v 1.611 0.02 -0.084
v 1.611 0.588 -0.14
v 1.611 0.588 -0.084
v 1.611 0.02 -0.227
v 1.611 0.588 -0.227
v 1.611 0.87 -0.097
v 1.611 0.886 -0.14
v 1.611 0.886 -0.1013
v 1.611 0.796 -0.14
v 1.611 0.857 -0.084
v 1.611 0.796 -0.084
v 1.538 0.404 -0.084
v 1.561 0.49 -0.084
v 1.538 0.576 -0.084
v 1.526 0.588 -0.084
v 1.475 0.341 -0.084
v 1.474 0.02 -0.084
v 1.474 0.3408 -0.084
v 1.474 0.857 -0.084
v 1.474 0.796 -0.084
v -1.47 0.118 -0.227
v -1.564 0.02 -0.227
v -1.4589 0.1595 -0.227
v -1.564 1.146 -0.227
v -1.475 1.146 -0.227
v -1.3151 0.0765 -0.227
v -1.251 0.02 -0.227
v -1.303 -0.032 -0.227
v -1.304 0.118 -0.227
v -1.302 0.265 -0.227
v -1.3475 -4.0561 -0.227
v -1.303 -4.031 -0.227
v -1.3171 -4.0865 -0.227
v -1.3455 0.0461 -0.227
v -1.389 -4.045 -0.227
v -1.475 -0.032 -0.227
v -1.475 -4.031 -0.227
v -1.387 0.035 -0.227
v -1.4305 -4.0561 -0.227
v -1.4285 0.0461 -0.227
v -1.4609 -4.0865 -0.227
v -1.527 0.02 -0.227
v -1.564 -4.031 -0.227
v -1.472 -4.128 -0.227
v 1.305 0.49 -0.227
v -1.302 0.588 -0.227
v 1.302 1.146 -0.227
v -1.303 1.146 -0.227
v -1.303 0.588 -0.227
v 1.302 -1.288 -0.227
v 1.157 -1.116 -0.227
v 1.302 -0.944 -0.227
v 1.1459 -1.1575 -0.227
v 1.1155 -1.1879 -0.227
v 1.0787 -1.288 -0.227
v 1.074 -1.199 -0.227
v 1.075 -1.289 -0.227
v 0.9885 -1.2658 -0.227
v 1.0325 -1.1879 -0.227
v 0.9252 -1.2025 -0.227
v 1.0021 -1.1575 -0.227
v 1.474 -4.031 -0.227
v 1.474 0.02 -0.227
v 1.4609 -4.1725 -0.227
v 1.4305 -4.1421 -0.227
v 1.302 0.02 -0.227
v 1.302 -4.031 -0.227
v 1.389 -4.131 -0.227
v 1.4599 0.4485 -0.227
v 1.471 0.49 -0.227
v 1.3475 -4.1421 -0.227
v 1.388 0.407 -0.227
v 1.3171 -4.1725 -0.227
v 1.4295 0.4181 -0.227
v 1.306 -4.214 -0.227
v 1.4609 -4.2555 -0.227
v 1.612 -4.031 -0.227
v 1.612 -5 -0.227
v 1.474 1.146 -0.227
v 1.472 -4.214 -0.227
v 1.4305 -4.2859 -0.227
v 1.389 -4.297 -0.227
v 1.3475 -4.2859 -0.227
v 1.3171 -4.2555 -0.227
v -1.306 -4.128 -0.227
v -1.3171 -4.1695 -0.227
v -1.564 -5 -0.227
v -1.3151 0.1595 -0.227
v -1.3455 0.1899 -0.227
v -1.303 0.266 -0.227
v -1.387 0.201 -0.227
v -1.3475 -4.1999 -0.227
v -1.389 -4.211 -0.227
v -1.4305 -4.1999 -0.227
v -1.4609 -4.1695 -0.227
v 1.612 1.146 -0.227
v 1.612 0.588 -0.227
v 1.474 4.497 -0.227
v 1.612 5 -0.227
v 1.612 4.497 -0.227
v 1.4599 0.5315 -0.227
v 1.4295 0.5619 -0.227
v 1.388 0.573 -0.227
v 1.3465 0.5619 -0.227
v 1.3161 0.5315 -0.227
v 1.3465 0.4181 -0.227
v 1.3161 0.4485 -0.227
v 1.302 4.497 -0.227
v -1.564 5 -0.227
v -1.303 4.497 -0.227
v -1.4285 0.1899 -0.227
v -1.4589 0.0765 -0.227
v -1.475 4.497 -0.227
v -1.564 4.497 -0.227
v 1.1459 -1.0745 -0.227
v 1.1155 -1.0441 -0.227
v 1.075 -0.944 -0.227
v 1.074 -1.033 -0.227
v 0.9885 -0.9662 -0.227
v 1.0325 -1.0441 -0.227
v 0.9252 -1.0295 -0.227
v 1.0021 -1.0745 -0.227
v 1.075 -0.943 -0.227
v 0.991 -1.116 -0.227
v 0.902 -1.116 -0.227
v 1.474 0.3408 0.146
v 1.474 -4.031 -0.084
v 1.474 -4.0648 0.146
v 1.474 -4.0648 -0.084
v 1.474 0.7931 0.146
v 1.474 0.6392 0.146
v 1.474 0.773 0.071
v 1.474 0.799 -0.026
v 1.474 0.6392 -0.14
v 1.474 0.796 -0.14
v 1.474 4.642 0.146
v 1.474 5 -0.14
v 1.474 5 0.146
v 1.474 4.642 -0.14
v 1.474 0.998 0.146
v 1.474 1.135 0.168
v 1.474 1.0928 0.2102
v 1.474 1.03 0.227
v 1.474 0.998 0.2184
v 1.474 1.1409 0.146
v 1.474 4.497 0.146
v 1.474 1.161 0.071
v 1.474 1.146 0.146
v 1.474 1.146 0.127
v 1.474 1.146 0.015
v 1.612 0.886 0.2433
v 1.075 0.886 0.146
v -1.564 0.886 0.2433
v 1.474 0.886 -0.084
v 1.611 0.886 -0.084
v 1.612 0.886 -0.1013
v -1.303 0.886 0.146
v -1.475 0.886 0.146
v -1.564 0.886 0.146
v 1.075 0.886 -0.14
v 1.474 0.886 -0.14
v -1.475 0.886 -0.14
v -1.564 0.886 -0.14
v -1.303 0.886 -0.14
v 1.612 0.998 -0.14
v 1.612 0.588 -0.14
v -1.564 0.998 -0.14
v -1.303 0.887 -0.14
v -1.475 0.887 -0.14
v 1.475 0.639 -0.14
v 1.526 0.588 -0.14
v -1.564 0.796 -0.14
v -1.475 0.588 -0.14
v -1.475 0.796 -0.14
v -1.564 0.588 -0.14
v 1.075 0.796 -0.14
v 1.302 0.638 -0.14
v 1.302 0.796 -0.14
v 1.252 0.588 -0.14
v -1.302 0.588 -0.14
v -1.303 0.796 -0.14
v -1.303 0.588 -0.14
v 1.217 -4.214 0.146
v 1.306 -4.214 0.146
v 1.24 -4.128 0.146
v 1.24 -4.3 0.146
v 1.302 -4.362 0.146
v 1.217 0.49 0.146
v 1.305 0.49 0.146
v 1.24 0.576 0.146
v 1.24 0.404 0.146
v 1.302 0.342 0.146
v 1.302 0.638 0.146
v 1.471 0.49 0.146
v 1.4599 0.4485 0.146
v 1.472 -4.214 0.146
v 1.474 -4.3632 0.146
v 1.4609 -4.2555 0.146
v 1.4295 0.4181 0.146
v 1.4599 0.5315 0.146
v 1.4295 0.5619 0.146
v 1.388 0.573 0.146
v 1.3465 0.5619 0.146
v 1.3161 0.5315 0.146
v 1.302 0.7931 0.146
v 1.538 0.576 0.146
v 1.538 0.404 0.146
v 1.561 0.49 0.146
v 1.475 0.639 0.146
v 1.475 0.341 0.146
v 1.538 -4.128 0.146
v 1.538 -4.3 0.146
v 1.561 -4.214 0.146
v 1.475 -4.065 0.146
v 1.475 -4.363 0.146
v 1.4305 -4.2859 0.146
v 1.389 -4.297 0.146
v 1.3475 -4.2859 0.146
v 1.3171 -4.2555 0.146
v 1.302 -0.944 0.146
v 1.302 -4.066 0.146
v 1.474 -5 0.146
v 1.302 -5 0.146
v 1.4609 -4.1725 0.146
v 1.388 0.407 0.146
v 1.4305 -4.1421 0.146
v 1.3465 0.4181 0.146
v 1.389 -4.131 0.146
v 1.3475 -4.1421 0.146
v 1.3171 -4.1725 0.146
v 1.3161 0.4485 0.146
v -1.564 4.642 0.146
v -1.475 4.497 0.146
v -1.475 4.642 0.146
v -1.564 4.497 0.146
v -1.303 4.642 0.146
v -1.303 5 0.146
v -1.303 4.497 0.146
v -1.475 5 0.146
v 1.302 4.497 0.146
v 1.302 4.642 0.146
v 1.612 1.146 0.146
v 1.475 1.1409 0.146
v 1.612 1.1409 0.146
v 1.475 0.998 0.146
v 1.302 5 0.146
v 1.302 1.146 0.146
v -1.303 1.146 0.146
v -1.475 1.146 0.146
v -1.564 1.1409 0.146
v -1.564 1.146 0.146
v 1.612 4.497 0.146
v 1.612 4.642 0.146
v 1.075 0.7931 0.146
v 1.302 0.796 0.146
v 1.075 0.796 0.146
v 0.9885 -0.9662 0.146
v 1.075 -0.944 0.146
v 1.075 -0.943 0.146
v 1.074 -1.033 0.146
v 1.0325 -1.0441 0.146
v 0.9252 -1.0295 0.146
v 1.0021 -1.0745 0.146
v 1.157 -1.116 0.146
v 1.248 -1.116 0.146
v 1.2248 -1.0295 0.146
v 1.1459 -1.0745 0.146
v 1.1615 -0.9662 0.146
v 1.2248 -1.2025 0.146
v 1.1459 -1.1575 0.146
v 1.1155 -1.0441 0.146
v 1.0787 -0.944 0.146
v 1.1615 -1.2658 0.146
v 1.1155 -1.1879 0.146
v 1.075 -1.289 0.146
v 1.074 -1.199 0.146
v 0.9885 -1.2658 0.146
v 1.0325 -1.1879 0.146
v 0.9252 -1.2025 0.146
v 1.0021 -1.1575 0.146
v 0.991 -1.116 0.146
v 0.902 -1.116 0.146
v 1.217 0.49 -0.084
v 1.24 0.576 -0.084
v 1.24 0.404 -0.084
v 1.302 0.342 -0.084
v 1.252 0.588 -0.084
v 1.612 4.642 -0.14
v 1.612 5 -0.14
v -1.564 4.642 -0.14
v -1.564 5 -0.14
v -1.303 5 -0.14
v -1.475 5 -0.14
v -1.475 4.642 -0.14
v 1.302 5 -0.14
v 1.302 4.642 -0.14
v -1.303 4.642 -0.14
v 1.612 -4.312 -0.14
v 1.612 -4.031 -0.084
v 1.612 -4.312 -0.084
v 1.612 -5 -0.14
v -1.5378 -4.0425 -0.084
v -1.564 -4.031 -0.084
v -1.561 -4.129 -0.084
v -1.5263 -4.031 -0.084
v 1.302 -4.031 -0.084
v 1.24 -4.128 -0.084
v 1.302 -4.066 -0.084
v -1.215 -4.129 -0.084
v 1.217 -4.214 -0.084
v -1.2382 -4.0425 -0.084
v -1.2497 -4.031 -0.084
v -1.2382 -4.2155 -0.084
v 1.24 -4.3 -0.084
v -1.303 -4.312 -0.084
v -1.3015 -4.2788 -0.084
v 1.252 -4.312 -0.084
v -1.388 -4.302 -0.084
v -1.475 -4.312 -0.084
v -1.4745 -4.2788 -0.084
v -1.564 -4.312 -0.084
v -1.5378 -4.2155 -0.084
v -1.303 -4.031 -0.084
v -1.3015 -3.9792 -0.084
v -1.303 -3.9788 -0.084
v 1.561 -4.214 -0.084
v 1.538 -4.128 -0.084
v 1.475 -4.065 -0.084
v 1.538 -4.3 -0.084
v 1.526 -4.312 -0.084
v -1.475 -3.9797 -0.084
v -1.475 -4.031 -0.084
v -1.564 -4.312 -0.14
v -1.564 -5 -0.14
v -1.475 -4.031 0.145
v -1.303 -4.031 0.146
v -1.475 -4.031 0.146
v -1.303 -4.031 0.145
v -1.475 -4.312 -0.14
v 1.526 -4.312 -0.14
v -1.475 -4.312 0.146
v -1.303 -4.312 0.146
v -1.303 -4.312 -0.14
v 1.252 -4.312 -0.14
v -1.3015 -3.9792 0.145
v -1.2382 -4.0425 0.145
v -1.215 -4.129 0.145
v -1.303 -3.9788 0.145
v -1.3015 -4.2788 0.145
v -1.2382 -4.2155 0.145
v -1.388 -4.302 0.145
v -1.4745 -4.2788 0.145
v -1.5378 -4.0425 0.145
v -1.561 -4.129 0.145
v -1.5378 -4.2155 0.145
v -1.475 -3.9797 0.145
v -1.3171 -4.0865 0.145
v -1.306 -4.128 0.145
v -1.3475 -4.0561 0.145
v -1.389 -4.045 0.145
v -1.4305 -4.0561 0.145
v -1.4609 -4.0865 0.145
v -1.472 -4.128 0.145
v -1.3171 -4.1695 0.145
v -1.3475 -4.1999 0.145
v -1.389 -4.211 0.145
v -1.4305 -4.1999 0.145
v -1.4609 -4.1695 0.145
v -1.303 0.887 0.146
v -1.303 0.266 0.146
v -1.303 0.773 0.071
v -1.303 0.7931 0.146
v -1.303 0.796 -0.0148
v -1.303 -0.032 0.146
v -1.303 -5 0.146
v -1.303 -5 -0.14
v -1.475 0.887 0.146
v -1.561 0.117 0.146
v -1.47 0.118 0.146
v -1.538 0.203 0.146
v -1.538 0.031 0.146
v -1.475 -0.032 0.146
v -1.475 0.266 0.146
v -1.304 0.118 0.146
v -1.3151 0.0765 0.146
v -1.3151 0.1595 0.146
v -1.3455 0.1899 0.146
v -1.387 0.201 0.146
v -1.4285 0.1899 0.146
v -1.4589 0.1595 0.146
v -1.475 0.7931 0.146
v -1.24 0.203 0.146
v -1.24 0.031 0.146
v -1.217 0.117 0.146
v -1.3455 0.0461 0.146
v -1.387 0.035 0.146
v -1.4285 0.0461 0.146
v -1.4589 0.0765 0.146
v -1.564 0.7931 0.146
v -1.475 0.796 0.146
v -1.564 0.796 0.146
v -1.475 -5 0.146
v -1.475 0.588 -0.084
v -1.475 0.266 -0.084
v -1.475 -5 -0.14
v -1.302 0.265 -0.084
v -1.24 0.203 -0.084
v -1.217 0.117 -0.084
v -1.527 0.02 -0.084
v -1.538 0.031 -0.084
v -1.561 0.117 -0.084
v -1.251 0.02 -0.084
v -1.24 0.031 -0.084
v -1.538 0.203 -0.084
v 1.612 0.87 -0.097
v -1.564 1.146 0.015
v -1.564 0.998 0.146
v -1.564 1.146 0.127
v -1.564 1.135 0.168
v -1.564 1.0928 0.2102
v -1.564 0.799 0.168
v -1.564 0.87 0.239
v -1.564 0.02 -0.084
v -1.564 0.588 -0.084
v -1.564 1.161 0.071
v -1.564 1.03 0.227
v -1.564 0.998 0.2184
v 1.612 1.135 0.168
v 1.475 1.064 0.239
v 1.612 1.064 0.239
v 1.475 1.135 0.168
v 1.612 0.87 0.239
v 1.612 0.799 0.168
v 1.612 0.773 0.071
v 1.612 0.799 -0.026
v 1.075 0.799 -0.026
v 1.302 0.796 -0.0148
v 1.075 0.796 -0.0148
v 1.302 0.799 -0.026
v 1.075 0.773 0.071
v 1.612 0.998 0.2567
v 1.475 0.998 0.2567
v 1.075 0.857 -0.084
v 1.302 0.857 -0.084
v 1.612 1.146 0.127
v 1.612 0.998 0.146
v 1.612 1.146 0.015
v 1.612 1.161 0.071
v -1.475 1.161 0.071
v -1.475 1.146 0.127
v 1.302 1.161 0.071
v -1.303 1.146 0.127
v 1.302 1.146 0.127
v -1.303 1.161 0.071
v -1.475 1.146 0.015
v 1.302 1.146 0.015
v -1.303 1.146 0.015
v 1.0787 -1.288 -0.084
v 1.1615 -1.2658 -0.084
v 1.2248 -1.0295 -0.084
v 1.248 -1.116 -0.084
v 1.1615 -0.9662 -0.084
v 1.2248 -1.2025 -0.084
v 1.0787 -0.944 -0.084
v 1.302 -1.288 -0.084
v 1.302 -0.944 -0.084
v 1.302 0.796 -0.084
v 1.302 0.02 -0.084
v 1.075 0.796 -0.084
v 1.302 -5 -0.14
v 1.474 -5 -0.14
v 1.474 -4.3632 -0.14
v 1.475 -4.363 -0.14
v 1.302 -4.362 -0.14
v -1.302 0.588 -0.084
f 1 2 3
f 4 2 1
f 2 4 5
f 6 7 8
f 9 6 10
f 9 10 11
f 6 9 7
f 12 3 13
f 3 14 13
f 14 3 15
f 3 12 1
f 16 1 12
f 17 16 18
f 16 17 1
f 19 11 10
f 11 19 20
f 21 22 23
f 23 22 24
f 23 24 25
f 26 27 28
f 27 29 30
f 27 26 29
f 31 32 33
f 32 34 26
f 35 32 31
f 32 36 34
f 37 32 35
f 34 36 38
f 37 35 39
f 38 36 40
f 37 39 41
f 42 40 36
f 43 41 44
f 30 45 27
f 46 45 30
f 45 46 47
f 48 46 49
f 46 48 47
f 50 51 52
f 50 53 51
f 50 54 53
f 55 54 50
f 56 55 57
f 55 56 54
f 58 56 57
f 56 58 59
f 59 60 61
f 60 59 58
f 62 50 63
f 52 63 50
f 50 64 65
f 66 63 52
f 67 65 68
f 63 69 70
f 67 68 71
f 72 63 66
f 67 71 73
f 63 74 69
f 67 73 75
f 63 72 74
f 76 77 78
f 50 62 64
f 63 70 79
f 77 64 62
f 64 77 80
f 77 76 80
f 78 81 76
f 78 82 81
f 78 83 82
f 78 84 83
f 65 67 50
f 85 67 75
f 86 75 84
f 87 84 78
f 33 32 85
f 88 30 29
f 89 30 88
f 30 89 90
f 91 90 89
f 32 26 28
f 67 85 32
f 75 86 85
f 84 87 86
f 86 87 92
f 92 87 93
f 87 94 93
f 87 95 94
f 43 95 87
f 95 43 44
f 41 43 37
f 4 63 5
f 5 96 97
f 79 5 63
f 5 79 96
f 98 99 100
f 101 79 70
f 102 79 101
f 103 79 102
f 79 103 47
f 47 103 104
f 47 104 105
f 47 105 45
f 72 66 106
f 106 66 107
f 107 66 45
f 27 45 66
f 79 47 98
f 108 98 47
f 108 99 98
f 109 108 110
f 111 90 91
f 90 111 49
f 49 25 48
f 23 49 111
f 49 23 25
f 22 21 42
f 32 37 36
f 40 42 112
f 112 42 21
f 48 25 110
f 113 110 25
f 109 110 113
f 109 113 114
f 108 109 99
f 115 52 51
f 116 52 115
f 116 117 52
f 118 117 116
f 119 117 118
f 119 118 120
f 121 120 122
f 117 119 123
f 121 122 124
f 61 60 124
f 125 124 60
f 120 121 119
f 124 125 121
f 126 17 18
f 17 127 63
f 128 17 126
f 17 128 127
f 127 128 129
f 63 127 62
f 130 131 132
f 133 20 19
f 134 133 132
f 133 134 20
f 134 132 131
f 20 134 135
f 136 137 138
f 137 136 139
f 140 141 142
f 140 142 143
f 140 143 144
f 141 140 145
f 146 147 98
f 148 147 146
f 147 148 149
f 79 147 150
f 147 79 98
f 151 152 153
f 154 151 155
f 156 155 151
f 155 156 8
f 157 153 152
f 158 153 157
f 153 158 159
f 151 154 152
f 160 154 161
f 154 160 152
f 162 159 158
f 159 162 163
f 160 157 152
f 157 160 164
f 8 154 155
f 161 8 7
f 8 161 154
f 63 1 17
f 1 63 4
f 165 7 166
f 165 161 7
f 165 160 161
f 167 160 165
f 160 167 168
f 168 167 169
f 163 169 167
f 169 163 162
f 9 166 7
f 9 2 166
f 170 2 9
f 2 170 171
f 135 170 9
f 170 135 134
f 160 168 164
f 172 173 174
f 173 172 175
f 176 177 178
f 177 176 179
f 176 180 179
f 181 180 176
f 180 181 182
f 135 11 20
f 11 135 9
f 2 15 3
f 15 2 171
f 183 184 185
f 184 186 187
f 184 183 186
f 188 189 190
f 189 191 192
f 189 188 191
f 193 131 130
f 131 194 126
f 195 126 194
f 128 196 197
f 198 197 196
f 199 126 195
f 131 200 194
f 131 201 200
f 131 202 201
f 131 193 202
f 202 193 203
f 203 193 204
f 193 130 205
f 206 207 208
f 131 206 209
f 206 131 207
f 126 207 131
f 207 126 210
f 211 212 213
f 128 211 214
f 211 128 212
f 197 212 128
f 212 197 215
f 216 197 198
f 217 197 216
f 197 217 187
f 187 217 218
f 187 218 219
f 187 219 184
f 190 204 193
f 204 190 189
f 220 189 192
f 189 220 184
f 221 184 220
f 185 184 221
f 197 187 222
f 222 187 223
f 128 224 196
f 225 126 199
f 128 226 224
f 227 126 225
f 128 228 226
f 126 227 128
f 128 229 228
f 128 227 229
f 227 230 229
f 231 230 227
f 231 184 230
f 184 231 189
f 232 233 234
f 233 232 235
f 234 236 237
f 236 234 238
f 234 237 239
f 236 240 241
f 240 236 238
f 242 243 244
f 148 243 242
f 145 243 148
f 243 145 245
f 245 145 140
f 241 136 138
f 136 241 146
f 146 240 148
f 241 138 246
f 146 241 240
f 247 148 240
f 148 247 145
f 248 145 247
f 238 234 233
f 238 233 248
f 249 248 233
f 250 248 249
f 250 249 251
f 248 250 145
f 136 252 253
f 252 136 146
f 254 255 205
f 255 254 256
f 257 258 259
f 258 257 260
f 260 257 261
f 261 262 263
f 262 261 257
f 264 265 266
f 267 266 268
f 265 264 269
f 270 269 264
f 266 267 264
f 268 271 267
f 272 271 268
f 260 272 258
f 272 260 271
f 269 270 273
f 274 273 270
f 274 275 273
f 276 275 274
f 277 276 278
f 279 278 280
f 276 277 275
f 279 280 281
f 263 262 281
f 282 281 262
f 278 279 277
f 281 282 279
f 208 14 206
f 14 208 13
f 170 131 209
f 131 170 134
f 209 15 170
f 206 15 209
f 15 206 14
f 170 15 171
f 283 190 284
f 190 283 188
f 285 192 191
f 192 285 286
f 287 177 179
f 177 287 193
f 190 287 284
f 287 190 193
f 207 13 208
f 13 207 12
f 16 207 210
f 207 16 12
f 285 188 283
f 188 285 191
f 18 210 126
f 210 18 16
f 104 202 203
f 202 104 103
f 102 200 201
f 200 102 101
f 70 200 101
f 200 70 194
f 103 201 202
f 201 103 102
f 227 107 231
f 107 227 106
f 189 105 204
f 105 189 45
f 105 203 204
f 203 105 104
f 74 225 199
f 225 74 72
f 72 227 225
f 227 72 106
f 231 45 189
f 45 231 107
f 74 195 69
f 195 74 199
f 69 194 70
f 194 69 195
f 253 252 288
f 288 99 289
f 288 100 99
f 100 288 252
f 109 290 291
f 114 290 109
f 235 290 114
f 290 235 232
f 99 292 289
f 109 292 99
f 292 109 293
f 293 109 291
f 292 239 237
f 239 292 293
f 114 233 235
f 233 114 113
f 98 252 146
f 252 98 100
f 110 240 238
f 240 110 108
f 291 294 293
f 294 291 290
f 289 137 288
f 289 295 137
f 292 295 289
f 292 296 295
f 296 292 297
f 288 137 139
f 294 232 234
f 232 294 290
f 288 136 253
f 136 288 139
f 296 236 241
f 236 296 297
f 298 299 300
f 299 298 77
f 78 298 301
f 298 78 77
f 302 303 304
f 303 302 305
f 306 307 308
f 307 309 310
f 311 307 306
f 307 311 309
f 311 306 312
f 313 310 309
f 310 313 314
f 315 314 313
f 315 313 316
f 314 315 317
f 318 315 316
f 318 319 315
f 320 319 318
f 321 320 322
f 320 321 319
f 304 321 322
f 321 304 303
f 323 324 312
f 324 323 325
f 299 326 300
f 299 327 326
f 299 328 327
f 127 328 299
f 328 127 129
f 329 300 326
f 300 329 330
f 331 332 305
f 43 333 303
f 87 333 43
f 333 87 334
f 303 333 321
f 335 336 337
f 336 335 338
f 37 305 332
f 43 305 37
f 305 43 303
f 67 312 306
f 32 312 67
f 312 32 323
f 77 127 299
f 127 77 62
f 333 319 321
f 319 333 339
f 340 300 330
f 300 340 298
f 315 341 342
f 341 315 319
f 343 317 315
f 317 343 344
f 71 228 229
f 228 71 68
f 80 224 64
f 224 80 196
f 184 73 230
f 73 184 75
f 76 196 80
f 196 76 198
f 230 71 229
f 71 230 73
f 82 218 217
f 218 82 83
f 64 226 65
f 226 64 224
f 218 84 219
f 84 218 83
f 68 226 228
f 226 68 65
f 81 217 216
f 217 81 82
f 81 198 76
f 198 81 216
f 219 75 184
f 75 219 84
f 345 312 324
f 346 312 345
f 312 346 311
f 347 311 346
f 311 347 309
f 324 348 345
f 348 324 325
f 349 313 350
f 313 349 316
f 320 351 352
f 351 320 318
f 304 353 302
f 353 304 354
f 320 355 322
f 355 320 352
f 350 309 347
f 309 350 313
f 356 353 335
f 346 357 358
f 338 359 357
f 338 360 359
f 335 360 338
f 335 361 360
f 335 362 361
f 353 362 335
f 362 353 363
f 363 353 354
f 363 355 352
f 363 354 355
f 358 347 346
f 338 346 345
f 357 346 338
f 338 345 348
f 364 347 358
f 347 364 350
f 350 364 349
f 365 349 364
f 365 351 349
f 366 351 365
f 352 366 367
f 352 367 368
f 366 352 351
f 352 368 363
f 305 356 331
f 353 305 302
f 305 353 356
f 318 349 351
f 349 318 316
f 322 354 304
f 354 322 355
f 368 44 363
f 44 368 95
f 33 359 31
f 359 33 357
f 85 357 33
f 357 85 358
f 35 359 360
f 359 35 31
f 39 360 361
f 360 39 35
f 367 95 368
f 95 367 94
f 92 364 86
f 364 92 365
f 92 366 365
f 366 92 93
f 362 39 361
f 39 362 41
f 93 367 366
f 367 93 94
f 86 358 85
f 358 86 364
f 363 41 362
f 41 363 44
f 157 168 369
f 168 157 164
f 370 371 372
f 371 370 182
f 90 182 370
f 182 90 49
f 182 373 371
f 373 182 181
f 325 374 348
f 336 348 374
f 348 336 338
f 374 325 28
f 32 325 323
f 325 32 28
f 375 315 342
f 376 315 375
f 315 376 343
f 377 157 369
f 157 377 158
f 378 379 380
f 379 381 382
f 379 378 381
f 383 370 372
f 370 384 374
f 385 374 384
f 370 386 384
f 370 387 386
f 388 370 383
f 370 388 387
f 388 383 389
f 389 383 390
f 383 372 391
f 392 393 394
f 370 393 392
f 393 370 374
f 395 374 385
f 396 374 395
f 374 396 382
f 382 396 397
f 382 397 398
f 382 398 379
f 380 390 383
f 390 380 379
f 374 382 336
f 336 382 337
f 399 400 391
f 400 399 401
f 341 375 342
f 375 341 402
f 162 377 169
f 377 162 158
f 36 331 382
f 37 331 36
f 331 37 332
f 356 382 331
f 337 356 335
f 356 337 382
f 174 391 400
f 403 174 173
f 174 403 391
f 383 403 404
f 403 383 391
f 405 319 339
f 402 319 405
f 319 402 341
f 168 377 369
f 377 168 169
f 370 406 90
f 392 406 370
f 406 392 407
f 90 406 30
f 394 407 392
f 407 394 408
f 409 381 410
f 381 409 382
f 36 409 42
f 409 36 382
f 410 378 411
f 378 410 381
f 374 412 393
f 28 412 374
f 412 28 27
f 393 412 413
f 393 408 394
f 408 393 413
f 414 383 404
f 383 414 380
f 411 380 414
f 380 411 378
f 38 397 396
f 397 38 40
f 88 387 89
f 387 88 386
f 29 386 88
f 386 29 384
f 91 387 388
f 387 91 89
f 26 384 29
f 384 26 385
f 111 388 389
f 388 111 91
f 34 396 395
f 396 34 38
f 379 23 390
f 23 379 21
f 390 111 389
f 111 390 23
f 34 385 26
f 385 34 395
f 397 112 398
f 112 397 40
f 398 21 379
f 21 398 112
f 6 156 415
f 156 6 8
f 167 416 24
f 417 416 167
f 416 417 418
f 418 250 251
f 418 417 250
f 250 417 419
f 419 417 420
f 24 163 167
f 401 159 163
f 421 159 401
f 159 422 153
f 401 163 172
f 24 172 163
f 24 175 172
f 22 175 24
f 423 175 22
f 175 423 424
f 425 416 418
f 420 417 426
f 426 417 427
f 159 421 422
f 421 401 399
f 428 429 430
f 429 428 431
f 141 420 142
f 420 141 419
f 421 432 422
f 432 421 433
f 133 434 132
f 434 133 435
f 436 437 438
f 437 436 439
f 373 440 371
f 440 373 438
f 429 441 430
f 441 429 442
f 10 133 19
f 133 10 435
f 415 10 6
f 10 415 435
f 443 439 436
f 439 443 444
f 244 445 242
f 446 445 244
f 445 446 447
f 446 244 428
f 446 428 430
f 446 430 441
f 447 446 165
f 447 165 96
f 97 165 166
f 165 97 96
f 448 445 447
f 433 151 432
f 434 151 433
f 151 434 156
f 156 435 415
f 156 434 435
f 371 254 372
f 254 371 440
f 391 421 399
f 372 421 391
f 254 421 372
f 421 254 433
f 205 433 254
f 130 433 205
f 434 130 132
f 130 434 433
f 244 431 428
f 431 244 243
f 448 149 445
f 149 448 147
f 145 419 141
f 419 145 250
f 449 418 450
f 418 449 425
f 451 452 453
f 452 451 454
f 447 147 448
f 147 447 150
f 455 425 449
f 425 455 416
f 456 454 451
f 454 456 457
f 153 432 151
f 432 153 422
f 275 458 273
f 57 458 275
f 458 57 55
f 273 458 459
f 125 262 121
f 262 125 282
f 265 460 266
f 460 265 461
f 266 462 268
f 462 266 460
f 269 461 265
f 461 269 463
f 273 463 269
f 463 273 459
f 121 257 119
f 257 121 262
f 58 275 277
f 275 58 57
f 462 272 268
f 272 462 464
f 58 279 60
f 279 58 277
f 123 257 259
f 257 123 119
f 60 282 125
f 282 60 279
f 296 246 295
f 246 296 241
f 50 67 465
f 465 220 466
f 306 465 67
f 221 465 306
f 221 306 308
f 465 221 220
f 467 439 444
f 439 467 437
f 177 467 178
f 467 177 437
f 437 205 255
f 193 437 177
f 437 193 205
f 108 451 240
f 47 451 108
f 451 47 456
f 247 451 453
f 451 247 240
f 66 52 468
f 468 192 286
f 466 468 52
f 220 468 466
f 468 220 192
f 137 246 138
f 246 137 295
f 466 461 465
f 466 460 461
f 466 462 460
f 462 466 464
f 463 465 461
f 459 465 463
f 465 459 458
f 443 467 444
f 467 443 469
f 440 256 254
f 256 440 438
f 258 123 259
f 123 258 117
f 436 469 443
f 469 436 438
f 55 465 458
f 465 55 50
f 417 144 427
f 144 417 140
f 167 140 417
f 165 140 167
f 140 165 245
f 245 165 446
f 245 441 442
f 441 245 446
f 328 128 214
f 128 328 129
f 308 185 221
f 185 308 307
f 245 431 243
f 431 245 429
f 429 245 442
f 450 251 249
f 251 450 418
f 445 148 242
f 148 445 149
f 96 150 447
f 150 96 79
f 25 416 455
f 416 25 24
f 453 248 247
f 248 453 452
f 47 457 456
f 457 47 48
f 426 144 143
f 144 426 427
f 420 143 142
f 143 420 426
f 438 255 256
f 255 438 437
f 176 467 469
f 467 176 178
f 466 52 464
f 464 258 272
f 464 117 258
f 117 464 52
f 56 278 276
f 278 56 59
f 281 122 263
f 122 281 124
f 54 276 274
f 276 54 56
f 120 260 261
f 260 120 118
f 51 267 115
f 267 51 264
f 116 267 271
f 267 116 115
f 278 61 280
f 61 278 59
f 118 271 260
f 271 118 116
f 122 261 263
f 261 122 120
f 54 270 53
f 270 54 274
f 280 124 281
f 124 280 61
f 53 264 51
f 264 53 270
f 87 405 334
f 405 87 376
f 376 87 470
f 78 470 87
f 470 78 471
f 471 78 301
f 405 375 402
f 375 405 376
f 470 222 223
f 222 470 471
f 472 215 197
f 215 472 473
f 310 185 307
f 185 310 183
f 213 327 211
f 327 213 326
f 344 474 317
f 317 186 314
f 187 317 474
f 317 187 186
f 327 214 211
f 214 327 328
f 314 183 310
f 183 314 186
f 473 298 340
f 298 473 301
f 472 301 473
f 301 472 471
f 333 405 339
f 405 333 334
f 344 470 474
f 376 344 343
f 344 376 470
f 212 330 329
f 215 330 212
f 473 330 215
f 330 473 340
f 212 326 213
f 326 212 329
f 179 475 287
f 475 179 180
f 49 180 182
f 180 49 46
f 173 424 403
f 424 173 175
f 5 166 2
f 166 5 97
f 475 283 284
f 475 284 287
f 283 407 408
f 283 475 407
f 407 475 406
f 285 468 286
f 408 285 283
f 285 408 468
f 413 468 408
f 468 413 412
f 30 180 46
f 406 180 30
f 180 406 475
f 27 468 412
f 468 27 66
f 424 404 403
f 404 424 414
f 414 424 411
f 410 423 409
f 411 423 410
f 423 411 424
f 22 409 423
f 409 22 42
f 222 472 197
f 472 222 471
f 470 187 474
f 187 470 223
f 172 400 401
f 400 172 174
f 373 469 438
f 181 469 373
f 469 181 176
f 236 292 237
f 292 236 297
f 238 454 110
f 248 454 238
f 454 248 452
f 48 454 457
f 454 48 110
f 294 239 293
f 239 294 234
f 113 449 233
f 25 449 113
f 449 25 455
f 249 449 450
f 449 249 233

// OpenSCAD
intersection() {
union() {
difference() {
translate([1.474, 0.02, -0.227]) cube(size = [0.137, 0.866, 0.143], center = false);
translate([1.302, 0.588, -0.14]) cube(size = [16.798, 0.208, 0.286], center = false);
}
translate([-1.564, 0.998, -0.227]) cube(size = [3.176, 0.148, 0.373], center = false);
translate([-1.564, 0.588, -0.227]) cube(size = [3.176, 0.41, 0.087], center = false);
translate([-1.302, 0.02, -0.227]) cube(size = [2.605, 0.568, 0.143], center = false);
translate([-1.564, 0.02, -0.227]) cube(size = [0.09, 0.568, 0.143], center = false);
difference() {
rotate([180, 0, 180])
translate([-1.389, 0.49, -0.146])
cylinder(h = 0.373, r1 = 0.172, r2 = 0.172, center = false, $fn = 12);
rotate([180, 0, 180])
translate([-1.388, 0.49, -0.146])
cylinder(h = 0.373, r1 = 0.083, r2 = 0.083, center = false, $fn = 12);
}
translate([1.302, -5, -0.227]) cube(size = [0.172, 0.688, 0.373], center = false);
difference() {
translate([-1.564, 4.497, -0.227]) cube(size = [3.176, 0.503, 0.373], center = false);
translate([-18.1, 4.642, -0.14]) cube(size = [36.2, 0.358, 18.24], center = false);
}
difference() {
union() {
rotate([0, 0, 0])
translate([-1.388, -4.129, -0.084])
cylinder(h = 0.229, r1 = 0.173, r2 = 0.173, center = false, $fn = 12);
difference() {
translate([-1.564, -4.312, -0.227]) cube(size = [3.176, 0.281, 0.143], center = false);
rotate([180, 0, 180])
translate([-1.389, -4.214, -18.1])
cylinder(h = 18.327, r1 = 0.083, r2 = 0.083, center = false, $fn = 12);
}
}
rotate([0, 0, 0])
translate([-1.389, -4.128, -18.1])
cylinder(h = 36.2, r1 = 0.083, r2 = 0.083, center = false, $fn = 12);
}
translate([-1.564, 0.796, -0.227]) cube(size = [2.639, 0.09, 0.373], center = false);
difference() {
union() {
translate([-1.475, -1.288, -0.227]) cube(size = [0.172, 2.175, 0.373], center = false);
rotate([0, 0, 0])
translate([-1.389, 0.117, -0.227])
cylinder(h = 0.373, r1 = 0.172, r2 = 0.172, center = false, $fn = 12);
}
rotate([0, 0, 0])
translate([-1.387, 0.118, -0.227])
cylinder(h = 0.373, r1 = 0.083, r2 = 0.083, center = false, $fn = 12);
}
difference() {
difference() {
union() {
rotate([180, 90, 180])
translate([-0.071, 0.967, -1.564])
cylinder(h = 3.176, r1 = 0.194, r2 = 0.194, center = false, $fn = 12);
rotate([180, 0, 180])
translate([-1.075, -1.116, -0.146])
cylinder(h = 0.373, r1 = 0.173, r2 = 0.173, center = false, $fn = 12);
translate([1.302, -4.312, -0.227]) cube(size = [0.172, 9.312, 0.373], center = false);
translate([1.075, -1.288, -0.227]) cube(size = [0.399, 2.175, 0.143], center = false);
}
intersection() {
translate([-1.564, -18.1, -0.227]) cube(size = [19.664, 19.098, 18.327], center = false);
union() {
translate([-1.564, -0.944, -18.1]) cube(size = [0.09, 1.942, 18.246], center = false);
rotate([180, 0, 180])
translate([-1.389, -4.214, -0.146])
cylinder(h = 0.373, r1 = 0.172, r2 = 0.172, center = false, $fn = 12);
}
}
}
union() {
difference() {
translate([-1.564, 0.886, -0.227]) cube(size = [3.039, 0.26, 18.327], center = false);
rotate([180, 90, 180])
translate([-0.08, 1.03, -18.1])
cylinder(h = 19.574, r1 = 0.147, r2 = 0.147, center = false, $fn = 12);
}
intersection() {
union() {
translate([-1.564, 0.886, -0.227]) cube(size = [3.176, 0.112, 18.327], center = false);
translate([1.075, -18.1, -0.227]) cube(size = [0.227, 18.896, 0.373], center = false);
}
translate([-1.564, -0.944, -0.227]) cube(size = [3.176, 2.09, 18.327], center = false);
}
rotate([180, 0, 180])
translate([-1.074, -1.116, -18.1])
cylinder(h = 18.327, r1 = 0.083, r2 = 0.083, center = false, $fn = 12);
rotate([180, 0, 180])
translate([-1.389, 0.49, -0.146])
cylinder(h = 0.373, r1 = 0.172, r2 = 0.172, center = false, $fn = 12);
}
}
difference() {
union() {
rotate([180, 0, 180])
translate([-1.389, -4.214, -0.146])
cylinder(h = 0.286, r1 = 0.172, r2 = 0.172, center = false, $fn = 12);
translate([-1.564, -5, -0.227]) cube(size = [3.176, 0.688, 0.087], center = false);
difference() {
translate([-1.475, -5, -0.227]) cube(size = [0.172, 3.712, 0.373], center = false);
translate([-1.475, -4.312, -0.227]) cube(size = [2.949, 0.281, 0.373], center = false);
}
}
rotate([180, 0, 180])
translate([-1.389, -4.214, -0.146])
cylinder(h = 0.286, r1 = 0.083, r2 = 0.083, center = false, $fn = 12);
}
translate([-1.475, 0.998, -0.227]) cube(size = [0.172, 4.002, 0.373], center = false);
}
translate([-1.942, -6, -0.273]) cube(size = [3.883, 12, 0.546], center = false);
}
